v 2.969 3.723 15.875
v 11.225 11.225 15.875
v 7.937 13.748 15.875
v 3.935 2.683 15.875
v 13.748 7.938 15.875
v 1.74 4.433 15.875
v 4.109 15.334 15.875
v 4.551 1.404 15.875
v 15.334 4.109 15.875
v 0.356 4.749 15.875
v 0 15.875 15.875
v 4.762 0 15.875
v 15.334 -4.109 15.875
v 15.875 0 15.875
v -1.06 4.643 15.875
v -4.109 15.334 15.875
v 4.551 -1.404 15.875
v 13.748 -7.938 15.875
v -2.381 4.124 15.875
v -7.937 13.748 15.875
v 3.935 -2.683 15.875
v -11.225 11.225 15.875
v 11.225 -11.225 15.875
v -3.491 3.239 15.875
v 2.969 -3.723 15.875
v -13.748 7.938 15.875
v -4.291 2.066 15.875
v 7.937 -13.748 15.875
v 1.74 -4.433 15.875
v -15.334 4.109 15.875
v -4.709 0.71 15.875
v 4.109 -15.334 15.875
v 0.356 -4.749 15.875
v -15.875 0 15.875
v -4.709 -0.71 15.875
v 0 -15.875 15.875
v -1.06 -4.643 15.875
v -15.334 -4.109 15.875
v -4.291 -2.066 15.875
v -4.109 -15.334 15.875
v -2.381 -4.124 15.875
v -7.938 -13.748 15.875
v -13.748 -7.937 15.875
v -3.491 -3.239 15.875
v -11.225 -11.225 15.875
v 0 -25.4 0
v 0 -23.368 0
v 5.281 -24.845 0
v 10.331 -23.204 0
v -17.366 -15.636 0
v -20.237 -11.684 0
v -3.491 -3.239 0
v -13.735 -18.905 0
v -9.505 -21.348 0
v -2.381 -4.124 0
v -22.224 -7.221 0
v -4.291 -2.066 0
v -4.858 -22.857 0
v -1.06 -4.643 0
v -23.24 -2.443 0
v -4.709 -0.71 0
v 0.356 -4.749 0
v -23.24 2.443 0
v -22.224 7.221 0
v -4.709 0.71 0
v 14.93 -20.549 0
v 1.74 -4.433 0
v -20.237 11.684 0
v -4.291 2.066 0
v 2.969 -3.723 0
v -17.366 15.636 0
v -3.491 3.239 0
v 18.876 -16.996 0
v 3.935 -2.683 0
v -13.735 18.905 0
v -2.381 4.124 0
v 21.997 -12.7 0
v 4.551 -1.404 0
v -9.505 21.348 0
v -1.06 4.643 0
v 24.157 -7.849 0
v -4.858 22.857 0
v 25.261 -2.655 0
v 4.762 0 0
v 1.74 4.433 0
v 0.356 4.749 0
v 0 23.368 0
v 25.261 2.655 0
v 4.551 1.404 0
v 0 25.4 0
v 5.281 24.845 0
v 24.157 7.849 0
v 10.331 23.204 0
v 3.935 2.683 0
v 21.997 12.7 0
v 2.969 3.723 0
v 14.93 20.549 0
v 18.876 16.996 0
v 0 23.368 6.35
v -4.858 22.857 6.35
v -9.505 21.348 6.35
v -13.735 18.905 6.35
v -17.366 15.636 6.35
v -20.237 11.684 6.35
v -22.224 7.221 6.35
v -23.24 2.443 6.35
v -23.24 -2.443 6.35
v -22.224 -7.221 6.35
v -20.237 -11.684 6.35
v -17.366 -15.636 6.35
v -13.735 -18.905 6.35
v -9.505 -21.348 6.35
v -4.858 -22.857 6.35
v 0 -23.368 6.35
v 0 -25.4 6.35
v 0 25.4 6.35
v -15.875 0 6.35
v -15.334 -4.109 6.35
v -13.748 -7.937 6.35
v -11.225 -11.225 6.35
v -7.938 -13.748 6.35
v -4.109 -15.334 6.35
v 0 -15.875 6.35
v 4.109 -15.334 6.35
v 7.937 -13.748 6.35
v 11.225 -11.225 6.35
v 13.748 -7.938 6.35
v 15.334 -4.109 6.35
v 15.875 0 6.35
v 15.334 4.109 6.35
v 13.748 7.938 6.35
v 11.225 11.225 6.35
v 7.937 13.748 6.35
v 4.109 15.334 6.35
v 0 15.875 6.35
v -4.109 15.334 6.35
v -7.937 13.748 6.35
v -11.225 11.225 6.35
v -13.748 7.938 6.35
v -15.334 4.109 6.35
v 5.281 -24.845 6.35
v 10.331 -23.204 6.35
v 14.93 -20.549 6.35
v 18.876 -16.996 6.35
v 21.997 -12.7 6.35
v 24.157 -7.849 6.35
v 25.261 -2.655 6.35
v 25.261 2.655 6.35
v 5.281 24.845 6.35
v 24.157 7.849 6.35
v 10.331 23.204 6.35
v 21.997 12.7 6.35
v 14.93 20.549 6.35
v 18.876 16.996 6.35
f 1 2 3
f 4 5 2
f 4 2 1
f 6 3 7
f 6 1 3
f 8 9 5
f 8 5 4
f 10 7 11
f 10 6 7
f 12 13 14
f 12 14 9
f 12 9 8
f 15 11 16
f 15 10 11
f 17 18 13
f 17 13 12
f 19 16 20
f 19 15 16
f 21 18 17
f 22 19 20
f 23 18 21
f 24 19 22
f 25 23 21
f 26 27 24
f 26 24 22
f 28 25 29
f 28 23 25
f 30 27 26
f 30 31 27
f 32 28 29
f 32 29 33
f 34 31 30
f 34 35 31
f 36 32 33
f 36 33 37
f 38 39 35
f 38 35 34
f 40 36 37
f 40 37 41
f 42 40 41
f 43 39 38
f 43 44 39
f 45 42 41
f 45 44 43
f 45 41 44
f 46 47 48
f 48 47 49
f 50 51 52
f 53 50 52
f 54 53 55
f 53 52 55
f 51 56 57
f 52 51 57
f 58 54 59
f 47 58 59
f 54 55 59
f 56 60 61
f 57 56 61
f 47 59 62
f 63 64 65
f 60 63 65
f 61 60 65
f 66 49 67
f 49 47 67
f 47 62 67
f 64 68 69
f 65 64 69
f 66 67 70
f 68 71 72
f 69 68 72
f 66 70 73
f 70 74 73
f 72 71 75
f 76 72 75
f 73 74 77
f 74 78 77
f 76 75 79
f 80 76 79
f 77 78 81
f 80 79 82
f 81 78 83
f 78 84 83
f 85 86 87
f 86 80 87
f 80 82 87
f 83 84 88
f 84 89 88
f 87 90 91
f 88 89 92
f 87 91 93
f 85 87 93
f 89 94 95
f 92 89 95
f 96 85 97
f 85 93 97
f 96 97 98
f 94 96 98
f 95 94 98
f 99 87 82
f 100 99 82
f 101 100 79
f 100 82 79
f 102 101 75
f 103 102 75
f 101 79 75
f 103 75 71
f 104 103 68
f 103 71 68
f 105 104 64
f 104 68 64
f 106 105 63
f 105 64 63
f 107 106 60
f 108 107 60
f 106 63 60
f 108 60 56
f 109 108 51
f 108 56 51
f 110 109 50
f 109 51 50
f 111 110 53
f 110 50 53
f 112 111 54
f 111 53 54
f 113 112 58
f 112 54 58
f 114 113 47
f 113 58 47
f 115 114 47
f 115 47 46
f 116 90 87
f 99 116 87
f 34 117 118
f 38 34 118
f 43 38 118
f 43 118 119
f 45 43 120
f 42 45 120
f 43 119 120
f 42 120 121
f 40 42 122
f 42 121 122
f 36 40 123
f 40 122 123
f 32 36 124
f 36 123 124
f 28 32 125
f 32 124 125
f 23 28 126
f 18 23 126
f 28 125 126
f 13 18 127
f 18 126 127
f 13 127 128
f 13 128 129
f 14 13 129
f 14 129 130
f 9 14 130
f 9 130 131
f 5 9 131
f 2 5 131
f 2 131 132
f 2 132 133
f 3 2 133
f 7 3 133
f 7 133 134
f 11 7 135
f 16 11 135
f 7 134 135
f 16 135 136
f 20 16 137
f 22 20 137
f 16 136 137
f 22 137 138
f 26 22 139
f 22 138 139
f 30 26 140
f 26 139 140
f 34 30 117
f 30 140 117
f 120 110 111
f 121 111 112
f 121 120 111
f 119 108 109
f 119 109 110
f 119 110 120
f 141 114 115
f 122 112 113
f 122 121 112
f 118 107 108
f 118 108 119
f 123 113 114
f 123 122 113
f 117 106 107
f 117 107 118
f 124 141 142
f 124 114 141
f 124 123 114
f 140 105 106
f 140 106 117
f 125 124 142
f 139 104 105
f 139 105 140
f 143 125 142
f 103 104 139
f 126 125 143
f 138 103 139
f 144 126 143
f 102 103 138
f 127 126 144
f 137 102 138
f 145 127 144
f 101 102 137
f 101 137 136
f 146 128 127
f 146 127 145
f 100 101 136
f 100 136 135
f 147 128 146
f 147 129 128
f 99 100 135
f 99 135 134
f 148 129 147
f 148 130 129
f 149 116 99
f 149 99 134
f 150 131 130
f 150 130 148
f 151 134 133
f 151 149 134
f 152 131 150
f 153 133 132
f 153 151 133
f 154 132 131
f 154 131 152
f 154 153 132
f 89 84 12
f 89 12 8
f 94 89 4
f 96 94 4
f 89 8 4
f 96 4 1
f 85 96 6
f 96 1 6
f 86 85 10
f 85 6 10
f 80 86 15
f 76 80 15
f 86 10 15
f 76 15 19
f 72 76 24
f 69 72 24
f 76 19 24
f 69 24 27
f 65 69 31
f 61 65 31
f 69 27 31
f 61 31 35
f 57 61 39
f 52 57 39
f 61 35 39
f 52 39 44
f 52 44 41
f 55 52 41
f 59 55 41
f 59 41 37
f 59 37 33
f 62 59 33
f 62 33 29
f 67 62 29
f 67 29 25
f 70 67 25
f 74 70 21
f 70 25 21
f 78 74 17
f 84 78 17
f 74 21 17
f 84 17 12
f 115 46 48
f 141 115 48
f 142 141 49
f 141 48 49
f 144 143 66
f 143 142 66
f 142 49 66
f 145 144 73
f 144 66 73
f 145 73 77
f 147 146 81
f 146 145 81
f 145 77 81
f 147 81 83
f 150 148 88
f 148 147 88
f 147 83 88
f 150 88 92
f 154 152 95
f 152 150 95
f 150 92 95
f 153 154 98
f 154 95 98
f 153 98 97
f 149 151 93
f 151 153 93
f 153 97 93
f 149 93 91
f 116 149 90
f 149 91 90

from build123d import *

# Parameters (mm, degrees)
SKETCH1_R           = 25.4
BOSS_EXTRUDE1_DEPTH = 6.35
SKETCH2_R           = 15.875
BOSS_EXTRUDE2_DEPTH = 9.525
SKETCH3_R           = 4.7625
CUT_EXTRUDE1_DEPTH  = 15.875
CUT_EXTRUDE2_DEPTH  = 6.35


with BuildPart() as part:
    # Sketch1 → Boss-Extrude1 (new body)
    with BuildSketch(Plane.XY):
        Circle(SKETCH1_R)
    extrude(amount=BOSS_EXTRUDE1_DEPTH)

    # Sketch2 → Boss-Extrude2 (add)
    with BuildSketch(Plane.XY.offset(6.35)):
        with Locations(Location((0, 0, 0), (0, 0, 180))):
            Circle(SKETCH2_R)
    extrude(amount=BOSS_EXTRUDE2_DEPTH)

    # Sketch3 → Cut-Extrude1 (cut)
    with BuildSketch(Plane.XY.offset(15.875)):
        Circle(SKETCH3_R)
    extrude(amount=-CUT_EXTRUDE1_DEPTH, mode=Mode.SUBTRACT)

    # Sketch4 → Cut-Extrude2 (cut)
    with BuildSketch(Plane(origin=(0, 0, 0), x_dir=(-1, 0, 0), z_dir=(0, 0, -1))):
        with BuildLine():
            Line((0, 25.4), (0, 23.368))
            ThreePointArc((0, 23.368), (23.368, 0), (0, -23.368))
            Line((0, -23.368), (0, -25.4))
            ThreePointArc((0, -25.4), (25.4, 0), (0, 25.4))
        make_face()
    extrude(amount=-CUT_EXTRUDE2_DEPTH, mode=Mode.SUBTRACT)


solid = part.part
